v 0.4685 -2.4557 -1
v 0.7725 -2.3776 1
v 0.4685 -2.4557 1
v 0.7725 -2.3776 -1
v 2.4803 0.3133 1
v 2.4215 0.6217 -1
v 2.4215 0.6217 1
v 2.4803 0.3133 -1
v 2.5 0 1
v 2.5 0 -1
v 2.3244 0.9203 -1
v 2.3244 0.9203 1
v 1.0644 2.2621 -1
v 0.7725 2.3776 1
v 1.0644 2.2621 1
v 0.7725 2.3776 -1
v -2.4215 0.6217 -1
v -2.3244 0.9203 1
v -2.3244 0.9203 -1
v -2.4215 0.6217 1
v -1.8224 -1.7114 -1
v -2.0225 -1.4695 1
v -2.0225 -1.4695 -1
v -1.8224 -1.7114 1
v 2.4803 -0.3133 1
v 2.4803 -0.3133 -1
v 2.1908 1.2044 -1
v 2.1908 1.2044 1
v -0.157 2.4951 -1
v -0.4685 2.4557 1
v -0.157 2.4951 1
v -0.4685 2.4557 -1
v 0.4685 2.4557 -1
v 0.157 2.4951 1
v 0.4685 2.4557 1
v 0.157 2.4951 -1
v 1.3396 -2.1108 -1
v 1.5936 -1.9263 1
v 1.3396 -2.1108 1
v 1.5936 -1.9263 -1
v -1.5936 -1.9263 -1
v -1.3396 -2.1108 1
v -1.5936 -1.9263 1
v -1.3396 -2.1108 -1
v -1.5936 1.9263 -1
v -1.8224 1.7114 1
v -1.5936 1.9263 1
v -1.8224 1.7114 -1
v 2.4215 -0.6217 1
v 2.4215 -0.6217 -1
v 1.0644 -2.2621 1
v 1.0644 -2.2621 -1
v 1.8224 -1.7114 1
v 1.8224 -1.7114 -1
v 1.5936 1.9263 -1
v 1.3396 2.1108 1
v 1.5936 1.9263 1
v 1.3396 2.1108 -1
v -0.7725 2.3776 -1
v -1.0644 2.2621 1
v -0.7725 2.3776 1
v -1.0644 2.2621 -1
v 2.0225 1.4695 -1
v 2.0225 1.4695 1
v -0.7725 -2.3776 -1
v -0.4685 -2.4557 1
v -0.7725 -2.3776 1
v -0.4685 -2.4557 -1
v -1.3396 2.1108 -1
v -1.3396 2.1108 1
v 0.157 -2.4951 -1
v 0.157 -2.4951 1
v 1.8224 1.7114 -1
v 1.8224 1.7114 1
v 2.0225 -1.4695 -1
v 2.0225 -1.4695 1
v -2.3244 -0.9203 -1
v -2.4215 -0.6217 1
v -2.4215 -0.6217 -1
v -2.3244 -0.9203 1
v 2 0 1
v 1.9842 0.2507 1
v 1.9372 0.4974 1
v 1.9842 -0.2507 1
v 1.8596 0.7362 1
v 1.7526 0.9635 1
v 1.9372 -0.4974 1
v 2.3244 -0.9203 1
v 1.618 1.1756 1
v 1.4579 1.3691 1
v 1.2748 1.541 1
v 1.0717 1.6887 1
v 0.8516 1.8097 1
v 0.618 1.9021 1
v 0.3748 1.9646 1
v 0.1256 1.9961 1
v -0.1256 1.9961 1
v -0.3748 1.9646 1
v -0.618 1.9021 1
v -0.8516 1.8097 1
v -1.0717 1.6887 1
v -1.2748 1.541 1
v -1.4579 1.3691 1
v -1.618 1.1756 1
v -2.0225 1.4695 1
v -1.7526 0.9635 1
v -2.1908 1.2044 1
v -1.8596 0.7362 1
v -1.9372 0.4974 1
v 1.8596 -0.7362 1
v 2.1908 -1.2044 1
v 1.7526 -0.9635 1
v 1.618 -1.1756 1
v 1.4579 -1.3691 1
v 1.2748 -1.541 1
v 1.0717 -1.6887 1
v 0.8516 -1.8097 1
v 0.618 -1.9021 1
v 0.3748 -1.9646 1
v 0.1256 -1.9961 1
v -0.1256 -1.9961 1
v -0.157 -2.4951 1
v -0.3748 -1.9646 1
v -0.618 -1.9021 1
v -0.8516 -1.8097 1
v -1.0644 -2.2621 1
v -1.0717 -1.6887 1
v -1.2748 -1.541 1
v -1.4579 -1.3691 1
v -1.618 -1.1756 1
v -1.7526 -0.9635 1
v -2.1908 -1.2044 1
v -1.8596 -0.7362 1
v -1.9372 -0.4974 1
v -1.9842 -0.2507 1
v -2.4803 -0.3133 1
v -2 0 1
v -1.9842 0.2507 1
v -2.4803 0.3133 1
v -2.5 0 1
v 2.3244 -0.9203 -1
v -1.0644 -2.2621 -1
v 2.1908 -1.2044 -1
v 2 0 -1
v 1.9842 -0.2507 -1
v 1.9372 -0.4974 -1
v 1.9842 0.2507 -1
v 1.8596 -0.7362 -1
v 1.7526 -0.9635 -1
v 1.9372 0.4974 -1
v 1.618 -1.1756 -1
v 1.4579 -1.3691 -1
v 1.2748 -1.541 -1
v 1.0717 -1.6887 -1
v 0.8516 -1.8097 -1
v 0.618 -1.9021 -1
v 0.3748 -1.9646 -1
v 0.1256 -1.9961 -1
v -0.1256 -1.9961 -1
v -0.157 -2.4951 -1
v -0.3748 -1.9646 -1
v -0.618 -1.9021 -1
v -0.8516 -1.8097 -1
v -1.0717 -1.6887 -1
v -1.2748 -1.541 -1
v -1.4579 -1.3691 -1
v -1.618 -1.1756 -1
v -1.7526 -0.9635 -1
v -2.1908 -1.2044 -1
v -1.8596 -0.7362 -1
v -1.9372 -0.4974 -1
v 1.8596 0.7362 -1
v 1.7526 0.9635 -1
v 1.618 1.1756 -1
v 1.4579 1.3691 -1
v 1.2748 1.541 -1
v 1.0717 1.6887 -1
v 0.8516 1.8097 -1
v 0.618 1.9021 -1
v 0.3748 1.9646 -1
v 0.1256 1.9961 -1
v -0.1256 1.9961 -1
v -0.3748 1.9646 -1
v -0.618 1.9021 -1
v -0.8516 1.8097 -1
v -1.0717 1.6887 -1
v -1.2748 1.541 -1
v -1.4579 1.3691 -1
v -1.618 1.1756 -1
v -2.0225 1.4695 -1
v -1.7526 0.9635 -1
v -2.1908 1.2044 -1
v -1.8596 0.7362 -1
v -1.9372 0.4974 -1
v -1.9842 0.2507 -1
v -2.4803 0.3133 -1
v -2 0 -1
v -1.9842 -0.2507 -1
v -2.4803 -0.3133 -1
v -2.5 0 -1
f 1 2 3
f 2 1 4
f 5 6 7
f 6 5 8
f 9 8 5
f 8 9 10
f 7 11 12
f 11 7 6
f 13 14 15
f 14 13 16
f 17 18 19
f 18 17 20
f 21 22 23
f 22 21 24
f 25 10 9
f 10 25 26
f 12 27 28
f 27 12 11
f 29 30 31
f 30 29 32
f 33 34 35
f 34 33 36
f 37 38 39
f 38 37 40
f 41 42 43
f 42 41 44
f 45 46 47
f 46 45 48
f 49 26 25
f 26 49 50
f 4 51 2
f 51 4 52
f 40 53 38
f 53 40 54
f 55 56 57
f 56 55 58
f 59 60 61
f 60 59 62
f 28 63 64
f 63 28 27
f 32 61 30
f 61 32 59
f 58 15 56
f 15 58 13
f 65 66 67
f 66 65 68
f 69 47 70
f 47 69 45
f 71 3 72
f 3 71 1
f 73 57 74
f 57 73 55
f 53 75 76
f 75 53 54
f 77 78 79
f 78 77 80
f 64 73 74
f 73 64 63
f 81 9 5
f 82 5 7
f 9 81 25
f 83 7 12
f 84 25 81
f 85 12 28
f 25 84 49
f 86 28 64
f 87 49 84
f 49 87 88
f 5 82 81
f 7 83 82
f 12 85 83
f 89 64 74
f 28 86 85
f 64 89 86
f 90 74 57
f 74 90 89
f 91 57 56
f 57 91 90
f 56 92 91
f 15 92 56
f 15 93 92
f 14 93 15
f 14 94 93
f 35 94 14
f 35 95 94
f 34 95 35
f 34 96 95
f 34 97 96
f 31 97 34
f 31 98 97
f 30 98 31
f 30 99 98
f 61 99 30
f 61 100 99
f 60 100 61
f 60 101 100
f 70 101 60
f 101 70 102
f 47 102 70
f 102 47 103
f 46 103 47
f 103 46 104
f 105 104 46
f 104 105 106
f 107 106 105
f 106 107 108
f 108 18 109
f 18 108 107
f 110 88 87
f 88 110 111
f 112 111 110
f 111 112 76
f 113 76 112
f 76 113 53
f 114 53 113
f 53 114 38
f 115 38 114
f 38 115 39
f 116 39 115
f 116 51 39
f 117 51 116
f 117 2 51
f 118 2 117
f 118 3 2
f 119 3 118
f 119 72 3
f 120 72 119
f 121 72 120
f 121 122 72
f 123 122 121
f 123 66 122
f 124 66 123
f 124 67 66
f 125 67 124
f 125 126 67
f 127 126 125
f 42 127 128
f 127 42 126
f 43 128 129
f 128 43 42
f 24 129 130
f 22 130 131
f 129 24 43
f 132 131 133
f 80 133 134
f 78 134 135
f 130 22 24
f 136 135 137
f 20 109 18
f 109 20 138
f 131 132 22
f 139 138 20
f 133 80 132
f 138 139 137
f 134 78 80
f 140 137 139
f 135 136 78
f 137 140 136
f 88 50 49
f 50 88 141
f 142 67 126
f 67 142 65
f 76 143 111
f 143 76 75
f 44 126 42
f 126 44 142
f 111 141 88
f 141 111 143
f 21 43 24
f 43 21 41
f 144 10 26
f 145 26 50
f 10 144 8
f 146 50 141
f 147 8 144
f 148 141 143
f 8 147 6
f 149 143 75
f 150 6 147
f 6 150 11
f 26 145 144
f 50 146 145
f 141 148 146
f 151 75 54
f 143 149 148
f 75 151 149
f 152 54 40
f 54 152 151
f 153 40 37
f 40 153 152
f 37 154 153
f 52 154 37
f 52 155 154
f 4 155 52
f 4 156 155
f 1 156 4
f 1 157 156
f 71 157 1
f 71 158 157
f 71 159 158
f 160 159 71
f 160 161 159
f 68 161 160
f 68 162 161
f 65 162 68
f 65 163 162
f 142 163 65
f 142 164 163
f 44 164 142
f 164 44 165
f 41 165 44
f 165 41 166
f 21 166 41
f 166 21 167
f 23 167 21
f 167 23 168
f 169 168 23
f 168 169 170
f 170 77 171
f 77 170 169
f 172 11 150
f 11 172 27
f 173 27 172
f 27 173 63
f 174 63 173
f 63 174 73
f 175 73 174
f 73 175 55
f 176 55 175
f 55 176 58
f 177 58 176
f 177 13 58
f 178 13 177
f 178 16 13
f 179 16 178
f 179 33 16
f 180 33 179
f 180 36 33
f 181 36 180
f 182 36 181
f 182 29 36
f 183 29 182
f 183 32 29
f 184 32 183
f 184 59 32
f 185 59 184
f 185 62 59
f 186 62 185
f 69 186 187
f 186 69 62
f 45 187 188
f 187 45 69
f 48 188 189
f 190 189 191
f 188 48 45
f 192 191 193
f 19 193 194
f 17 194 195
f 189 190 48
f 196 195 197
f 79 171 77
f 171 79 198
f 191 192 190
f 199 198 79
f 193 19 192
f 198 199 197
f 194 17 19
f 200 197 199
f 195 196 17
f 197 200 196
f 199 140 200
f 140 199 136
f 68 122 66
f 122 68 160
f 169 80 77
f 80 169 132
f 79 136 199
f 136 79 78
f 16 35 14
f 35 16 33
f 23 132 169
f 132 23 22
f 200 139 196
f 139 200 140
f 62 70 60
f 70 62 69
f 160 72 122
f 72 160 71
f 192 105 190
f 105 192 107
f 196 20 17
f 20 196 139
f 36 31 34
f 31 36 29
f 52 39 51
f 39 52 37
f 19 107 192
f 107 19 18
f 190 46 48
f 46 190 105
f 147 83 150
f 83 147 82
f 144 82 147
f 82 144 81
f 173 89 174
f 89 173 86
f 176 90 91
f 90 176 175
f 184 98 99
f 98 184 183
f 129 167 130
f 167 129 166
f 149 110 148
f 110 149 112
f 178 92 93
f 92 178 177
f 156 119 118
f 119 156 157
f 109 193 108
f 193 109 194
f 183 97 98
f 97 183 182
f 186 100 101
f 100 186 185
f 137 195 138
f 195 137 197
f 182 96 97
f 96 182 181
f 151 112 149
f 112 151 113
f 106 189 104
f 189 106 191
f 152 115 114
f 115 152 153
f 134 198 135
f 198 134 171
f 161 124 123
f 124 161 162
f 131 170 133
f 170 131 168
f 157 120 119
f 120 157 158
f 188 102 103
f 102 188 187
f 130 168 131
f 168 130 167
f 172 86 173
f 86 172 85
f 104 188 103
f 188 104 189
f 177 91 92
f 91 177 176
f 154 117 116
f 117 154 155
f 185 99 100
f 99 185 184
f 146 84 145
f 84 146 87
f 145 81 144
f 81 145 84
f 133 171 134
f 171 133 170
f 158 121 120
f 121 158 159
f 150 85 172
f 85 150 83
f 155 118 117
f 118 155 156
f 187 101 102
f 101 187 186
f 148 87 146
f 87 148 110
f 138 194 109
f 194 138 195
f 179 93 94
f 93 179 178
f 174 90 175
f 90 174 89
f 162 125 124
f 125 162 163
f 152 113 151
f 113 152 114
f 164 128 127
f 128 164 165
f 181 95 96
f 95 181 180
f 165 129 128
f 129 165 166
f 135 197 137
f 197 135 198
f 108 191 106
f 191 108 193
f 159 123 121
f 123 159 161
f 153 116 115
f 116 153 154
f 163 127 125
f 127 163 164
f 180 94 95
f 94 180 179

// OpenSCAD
$fn = 50;


difference() {
	union() {
		translate(v = [0, 0, -1.0000000000]) {
			cylinder(h = 2, r = 2.5000000000);
		}
	}
	union() {
		translate(v = [0, 0, -100.0000000000]) {
			cylinder(h = 200, r = 2.0000000000);
		}
	}
}
